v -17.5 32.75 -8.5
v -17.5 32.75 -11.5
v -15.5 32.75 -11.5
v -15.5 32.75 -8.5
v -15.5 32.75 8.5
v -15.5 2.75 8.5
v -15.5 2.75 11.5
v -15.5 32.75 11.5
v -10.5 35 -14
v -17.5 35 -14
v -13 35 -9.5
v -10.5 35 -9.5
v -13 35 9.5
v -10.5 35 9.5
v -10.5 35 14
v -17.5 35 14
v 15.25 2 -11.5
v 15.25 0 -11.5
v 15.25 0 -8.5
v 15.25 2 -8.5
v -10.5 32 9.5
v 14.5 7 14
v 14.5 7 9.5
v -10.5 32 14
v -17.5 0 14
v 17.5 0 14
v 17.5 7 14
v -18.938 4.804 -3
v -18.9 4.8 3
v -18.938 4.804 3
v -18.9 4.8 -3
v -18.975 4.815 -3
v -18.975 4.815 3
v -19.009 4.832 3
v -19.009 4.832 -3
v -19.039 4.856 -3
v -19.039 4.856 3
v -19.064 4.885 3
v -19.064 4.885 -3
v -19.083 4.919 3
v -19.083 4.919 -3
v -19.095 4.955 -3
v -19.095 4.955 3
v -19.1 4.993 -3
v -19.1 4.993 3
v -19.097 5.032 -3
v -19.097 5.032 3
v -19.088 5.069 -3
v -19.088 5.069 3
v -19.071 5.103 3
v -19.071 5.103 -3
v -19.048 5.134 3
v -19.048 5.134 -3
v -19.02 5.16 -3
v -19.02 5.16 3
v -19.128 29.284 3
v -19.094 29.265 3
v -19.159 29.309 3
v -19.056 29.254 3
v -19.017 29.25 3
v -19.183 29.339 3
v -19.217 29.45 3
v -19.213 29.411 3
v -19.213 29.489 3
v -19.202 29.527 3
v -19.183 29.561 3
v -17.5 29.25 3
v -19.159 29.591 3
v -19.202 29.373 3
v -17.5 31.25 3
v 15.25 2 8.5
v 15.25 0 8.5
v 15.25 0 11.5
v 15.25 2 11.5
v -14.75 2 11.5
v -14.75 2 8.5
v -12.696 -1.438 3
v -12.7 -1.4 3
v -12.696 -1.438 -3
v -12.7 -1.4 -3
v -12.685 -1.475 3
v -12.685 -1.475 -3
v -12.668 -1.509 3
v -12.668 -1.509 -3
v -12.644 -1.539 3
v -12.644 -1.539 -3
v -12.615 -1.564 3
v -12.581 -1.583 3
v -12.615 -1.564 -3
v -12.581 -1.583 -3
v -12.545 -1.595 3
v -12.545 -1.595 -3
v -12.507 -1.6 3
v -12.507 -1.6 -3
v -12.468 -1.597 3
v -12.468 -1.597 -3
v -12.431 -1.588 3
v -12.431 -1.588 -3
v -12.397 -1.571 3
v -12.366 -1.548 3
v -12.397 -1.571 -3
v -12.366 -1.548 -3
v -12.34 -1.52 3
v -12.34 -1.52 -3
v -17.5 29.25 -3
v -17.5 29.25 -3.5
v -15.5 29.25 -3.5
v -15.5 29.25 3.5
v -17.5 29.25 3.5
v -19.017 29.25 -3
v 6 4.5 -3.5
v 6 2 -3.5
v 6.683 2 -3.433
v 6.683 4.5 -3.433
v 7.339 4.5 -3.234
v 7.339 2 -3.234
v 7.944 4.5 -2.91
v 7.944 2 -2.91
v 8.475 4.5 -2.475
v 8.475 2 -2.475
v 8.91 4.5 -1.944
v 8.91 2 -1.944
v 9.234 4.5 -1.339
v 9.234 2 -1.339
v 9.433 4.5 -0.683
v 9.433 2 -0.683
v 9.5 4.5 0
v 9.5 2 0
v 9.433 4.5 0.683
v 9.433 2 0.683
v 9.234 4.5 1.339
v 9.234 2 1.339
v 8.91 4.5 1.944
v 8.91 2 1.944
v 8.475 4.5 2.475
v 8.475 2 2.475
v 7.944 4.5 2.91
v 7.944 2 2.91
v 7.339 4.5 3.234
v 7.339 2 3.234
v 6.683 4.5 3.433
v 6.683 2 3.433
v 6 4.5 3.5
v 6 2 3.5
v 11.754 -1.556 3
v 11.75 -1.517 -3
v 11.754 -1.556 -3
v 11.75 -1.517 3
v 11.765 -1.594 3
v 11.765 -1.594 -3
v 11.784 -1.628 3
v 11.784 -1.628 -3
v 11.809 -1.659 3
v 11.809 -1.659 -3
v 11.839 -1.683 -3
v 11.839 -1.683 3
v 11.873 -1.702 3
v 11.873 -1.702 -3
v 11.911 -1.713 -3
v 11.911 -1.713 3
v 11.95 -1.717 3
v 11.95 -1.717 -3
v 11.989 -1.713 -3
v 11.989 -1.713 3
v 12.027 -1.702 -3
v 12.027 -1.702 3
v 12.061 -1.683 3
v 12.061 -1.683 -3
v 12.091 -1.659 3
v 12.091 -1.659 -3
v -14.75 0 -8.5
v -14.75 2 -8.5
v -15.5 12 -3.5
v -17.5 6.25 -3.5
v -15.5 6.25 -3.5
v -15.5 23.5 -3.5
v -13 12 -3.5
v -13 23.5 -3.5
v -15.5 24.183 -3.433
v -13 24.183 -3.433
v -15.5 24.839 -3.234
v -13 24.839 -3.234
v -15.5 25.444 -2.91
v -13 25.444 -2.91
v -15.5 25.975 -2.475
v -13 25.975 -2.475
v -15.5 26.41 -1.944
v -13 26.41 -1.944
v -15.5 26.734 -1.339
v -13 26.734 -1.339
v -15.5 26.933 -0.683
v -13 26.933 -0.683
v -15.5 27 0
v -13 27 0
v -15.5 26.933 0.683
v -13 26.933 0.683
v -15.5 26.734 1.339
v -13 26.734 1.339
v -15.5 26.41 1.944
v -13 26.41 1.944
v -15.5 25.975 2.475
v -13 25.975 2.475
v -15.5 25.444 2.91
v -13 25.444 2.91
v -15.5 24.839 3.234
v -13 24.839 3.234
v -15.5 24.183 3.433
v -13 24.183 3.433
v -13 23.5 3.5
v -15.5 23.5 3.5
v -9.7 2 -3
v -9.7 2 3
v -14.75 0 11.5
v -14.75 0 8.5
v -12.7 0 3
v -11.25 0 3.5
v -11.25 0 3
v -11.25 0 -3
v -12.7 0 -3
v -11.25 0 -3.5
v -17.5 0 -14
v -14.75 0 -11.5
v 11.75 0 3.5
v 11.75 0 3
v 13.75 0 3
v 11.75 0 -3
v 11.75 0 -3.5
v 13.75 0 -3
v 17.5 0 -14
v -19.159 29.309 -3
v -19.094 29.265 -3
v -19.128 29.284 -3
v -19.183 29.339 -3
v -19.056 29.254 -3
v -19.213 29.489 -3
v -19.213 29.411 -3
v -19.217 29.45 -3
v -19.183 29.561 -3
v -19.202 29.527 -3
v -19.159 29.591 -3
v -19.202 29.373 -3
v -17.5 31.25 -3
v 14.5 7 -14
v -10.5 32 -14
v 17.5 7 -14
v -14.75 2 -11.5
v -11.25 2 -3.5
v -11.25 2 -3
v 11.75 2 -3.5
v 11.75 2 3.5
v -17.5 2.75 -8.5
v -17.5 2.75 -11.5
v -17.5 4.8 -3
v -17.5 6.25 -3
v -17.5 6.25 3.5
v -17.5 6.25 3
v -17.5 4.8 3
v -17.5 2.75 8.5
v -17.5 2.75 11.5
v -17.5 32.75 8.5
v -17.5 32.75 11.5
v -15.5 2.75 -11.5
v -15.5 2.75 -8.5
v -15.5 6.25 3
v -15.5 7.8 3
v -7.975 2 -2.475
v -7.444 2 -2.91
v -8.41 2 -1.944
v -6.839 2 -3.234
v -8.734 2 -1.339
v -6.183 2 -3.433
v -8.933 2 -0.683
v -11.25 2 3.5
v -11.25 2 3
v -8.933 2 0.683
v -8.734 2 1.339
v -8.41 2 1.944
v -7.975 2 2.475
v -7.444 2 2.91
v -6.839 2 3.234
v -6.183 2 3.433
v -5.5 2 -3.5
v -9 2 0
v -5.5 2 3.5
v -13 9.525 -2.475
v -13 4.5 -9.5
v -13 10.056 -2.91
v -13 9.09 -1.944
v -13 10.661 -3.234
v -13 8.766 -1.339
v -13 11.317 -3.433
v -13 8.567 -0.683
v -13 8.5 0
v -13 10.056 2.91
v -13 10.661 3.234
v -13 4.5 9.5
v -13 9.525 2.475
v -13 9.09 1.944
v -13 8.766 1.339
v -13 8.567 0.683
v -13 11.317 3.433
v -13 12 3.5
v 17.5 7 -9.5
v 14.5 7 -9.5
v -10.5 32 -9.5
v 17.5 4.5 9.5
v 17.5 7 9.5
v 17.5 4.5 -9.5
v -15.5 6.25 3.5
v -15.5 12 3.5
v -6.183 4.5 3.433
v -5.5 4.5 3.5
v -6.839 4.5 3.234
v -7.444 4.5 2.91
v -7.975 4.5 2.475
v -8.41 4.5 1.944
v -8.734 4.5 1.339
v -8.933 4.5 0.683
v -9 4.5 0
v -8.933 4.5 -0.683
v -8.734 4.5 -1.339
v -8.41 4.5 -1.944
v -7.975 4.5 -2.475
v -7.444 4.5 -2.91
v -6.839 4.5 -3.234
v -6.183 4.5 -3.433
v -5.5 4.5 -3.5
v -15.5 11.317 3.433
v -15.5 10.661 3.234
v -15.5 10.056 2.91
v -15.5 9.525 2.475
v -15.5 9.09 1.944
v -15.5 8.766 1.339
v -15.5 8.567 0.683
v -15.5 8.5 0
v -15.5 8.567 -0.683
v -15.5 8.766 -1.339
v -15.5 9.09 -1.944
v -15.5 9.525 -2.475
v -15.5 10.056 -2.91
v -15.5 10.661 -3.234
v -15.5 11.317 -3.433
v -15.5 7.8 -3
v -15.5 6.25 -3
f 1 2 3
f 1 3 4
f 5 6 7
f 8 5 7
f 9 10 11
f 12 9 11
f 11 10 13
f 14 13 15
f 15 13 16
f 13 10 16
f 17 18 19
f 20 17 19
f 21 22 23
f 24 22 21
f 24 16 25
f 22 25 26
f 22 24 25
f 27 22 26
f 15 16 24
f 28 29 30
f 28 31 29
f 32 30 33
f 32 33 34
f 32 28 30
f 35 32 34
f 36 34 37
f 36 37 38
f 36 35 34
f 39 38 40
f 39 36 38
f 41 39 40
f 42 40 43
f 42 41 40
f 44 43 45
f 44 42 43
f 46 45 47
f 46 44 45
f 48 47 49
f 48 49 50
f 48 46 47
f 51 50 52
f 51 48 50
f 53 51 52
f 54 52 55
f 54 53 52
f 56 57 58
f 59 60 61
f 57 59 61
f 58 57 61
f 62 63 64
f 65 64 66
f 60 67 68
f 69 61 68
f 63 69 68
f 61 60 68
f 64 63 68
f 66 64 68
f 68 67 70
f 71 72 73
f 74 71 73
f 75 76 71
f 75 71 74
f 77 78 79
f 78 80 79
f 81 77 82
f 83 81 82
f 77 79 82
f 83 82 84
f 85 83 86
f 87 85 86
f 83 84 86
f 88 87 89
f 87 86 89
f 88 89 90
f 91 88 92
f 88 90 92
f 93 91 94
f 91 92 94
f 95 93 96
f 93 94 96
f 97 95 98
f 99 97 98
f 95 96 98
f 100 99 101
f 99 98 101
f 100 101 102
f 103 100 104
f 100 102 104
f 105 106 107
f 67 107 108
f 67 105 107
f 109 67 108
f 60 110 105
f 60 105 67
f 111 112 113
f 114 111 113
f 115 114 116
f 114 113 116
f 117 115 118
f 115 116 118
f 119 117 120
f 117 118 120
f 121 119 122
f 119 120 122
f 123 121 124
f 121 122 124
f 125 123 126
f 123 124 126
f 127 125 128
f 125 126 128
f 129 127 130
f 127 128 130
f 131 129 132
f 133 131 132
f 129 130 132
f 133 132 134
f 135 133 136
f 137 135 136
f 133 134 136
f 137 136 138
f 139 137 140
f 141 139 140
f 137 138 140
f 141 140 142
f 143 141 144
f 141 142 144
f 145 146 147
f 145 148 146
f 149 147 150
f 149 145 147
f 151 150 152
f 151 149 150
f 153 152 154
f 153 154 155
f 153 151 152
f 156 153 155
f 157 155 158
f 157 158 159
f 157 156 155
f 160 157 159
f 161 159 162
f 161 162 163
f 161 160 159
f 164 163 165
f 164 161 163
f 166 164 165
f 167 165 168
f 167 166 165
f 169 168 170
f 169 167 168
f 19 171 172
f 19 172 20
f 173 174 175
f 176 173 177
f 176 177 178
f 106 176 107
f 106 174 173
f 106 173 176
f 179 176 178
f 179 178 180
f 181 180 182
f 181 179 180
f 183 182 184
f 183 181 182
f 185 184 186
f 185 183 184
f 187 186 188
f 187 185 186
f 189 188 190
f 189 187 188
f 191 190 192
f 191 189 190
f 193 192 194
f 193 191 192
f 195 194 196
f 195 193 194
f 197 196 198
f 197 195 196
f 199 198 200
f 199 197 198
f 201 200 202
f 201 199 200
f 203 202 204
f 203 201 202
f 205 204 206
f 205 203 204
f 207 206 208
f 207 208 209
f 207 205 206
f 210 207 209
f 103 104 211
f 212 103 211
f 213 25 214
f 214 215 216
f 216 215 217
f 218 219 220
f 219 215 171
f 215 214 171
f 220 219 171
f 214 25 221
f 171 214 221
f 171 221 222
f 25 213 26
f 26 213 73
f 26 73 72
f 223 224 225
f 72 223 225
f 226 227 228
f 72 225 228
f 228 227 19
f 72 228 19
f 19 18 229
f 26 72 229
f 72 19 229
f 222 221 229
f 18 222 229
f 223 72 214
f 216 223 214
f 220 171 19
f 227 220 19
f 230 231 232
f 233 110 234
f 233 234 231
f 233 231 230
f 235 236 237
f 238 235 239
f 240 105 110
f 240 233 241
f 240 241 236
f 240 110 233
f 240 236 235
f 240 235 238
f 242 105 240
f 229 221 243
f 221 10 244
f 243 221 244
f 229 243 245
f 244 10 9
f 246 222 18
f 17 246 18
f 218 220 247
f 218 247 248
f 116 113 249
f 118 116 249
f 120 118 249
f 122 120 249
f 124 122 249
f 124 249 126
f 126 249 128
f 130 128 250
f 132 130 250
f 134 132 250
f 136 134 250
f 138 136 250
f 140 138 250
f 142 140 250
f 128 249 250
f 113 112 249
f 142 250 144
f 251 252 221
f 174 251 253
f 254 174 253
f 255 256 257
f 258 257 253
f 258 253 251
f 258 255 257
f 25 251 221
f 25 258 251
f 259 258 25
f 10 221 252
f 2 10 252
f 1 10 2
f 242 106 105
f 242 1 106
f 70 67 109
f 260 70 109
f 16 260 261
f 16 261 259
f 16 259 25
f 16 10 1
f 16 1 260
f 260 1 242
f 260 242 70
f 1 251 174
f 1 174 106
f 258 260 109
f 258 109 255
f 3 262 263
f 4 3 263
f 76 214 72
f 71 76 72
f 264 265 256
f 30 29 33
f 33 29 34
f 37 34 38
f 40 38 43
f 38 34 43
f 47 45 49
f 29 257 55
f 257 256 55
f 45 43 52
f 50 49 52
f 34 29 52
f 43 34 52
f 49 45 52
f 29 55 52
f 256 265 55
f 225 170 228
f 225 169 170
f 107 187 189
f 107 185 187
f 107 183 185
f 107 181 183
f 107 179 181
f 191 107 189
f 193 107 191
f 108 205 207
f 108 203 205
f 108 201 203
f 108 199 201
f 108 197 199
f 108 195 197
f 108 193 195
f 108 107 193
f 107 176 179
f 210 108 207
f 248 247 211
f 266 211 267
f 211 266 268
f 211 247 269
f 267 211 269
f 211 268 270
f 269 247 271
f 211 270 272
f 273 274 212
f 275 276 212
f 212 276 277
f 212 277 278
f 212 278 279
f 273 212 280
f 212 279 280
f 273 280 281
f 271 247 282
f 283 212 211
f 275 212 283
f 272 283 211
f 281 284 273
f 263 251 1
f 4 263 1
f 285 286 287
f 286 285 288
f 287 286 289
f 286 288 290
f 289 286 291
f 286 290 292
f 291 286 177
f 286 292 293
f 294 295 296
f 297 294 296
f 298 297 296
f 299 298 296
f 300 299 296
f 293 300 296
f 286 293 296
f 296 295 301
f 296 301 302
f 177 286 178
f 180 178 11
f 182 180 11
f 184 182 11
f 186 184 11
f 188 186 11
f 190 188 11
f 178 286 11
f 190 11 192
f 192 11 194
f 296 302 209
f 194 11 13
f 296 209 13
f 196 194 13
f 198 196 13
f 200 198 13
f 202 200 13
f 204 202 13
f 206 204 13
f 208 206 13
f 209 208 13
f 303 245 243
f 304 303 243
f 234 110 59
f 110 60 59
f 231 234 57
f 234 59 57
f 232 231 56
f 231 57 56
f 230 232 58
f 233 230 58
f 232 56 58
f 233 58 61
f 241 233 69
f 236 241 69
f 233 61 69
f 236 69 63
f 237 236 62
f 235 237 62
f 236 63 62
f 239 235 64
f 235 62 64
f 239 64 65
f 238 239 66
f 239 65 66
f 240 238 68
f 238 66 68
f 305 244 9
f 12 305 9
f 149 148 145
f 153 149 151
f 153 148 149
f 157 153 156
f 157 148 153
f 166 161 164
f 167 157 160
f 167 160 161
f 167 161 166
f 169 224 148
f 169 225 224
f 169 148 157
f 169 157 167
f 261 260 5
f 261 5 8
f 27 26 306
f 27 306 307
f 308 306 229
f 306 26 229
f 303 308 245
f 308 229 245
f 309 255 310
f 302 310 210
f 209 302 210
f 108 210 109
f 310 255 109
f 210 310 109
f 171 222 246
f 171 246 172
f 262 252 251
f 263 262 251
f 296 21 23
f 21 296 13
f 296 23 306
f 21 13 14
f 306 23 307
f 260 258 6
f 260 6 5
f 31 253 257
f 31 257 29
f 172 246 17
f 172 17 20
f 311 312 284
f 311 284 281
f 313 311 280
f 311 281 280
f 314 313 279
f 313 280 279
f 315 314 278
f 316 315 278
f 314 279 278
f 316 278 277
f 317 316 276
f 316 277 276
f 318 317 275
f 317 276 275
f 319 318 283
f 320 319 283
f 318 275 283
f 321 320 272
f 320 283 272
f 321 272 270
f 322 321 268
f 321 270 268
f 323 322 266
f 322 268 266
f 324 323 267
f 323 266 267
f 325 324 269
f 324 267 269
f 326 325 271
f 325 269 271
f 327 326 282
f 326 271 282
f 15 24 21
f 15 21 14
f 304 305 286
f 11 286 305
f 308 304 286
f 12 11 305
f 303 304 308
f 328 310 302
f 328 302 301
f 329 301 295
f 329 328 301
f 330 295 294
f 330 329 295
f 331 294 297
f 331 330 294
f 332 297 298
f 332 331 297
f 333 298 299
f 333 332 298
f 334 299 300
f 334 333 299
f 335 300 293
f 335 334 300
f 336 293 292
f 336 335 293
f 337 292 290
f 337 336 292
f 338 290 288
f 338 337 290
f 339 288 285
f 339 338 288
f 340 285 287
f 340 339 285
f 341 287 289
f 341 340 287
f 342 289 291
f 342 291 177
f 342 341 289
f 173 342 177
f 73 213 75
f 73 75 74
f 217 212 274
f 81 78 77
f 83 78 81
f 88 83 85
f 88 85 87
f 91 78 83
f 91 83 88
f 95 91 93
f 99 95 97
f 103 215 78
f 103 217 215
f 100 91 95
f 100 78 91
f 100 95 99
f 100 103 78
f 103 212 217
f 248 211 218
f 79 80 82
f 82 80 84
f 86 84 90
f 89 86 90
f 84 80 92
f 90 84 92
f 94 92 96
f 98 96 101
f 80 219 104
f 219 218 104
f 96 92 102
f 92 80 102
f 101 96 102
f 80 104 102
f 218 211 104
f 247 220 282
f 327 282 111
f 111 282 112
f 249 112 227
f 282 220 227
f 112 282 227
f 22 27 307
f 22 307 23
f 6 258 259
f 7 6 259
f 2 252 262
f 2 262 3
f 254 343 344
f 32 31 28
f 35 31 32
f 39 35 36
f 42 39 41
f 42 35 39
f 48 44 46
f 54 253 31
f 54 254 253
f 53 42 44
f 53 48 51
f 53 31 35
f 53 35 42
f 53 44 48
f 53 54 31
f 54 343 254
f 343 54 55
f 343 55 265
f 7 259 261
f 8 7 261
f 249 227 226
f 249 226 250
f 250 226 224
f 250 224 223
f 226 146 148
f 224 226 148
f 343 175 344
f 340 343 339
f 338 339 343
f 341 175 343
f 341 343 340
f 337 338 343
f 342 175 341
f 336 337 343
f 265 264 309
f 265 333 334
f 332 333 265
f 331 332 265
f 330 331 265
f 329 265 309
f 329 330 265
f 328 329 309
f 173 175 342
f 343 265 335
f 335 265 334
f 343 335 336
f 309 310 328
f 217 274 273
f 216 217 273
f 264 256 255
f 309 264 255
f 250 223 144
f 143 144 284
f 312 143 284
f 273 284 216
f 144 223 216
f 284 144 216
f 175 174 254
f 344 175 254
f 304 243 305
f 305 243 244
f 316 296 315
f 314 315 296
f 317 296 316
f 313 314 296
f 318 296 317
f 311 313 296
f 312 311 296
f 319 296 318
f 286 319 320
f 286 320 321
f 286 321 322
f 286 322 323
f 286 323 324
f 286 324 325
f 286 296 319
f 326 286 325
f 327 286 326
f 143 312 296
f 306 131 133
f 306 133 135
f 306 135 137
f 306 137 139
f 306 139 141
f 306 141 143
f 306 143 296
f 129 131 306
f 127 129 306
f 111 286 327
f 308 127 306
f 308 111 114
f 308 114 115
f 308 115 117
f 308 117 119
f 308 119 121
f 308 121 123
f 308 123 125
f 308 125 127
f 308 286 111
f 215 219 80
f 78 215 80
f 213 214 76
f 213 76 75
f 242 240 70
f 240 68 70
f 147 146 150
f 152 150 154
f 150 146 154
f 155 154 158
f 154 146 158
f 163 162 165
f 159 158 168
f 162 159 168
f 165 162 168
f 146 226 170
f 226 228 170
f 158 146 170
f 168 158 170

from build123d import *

# Parameters (mm, degrees)
SKETCH1_W           = 35
SKETCH1_H           = 28
BOSS_EXTRUDE1_DEPTH = 4.5
BOSS_EXTRUDE2_DEPTH = 4.5
SKETCH3_W           = 19
SKETCH3_H           = 30.5
BOSS_EXTRUDE3_DEPTH = 4.5
CUT_EXTRUDE1_DEPTH  = 4.5
SKETCH5_W           = 7
SKETCH5_H           = 23
SKETCH5_W_2         = 3
SKETCH5_H_2         = 30
CUT_EXTRUDE2_DEPTH  = 2
BOSS_EXTRUDE4_DEPTH = 3


with BuildPart() as part:
    # Sketch1 → Boss-Extrude1 (new body)
    with BuildSketch(Plane(origin=(0, 0, 0), x_dir=(1, 0, 0), z_dir=(0, 1, 0))):
        Rectangle(SKETCH1_W, SKETCH1_H)
        with BuildLine():
            Line((-5.5, 3.5), (6, 3.5))
            ThreePointArc((6, 3.5), (9.5, 0), (6, -3.5))
            Line((6, -3.5), (-5.5, -3.5))
            ThreePointArc((-5.5, -3.5), (-9, 0), (-5.5, 3.5))
        make_face(mode=Mode.SUBTRACT)
    extrude(amount=BOSS_EXTRUDE1_DEPTH)

    # Sketch2 → Boss-Extrude2 (add)
    with BuildSketch(Plane.XY.offset(14)):
        Polygon((17.5, 4.5), (17.5, 7), (14.5, 7), (-10.5, 32), (-10.5, 35), (-17.5, 35), (-17.5, 4.5), align=None)
    boss_extrude2 = extrude(amount=-BOSS_EXTRUDE2_DEPTH)

    # Mirror1: Boss-Extrude2 across plane
    add(boss_extrude2.mirror(Plane.XY))

    # Sketch3 → Boss-Extrude3 (add)
    with BuildSketch(Plane.ZY.offset(17.5)):
        with Locations((0, 19.75)):
            Rectangle(SKETCH3_W, SKETCH3_H)
    extrude(amount=-BOSS_EXTRUDE3_DEPTH)

    # Sketch4 → Cut-Extrude1 (cut)
    with BuildSketch(Plane.ZY.offset(17.5)):
        with BuildLine():
            Line((3.5, 23.5), (3.5, 12))
            ThreePointArc((3.5, 12), (0, 8.5), (-3.5, 12))
            Line((-3.5, 12), (-3.5, 23.5))
            ThreePointArc((-3.5, 23.5), (0, 27), (3.5, 23.5))
        make_face()
    cut_extrude1 = extrude(amount=-CUT_EXTRUDE1_DEPTH, mode=Mode.SUBTRACT)

    # Sketch5 → Cut-Extrude2 (cut)
    with BuildSketch(Plane.ZY.offset(17.5)):
        with Locations((0, 17.75)):
            Rectangle(SKETCH5_W, SKETCH5_H)
        with Locations((-10, 17.75)):
            Rectangle(SKETCH5_W_2, SKETCH5_H_2)
        with Locations((10, 17.75)):
            Rectangle(SKETCH5_W_2, SKETCH5_H_2)
    cut_extrude2 = extrude(amount=-CUT_EXTRUDE2_DEPTH, mode=Mode.SUBTRACT)

    # Sketch6 → Boss-Extrude4 (add, symmetric)
    with BuildSketch(Plane.XY):
        with BuildLine():
            Line((-17.5, 4.8), (-18.9, 4.8))
            ThreePointArc((-18.9, 4.8), (-19.08973666, 4.936754447), (-19.02, 5.16))
            Line((-19.02, 5.16), (-15.5, 7.8))
            Line((-15.5, 7.8), (-15.5, 4.8))
            Line((-15.5, 4.8), (-17.5, 4.8))
        make_face()
        with BuildLine():
            Line((-17.5, 29.25), (-19.017157288, 29.25))
            ThreePointArc((-19.017157288, 29.25), (-19.201933194, 29.373463314), (-19.158578644, 29.591421356))
            Line((-19.158578644, 29.591421356), (-17.5, 31.25))
            Line((-17.5, 31.25), (-17.5, 29.25))
        make_face()
    boss_extrude4 = extrude(amount=BOSS_EXTRUDE4_DEPTH, both=True)

    # Mirror2: Cut-Extrude1, Cut-Extrude2, Boss-Extrude4 across plane
    add(cut_extrude1.mirror(Plane(origin=(-8.75, 8.75, 0), x_dir=(0, 0, 1), z_dir=(-0.7071067811865475, 0.7071067811865477, 0))), mode=Mode.SUBTRACT)
    add(cut_extrude2.mirror(Plane(origin=(-8.75, 8.75, 0), x_dir=(0, 0, 1), z_dir=(-0.7071067811865475, 0.7071067811865477, 0))), mode=Mode.SUBTRACT)
    add(boss_extrude4.mirror(Plane(origin=(-8.75, 8.75, 0), x_dir=(0, 0, 1), z_dir=(-0.7071067811865475, 0.7071067811865477, 0))))


solid = part.part
